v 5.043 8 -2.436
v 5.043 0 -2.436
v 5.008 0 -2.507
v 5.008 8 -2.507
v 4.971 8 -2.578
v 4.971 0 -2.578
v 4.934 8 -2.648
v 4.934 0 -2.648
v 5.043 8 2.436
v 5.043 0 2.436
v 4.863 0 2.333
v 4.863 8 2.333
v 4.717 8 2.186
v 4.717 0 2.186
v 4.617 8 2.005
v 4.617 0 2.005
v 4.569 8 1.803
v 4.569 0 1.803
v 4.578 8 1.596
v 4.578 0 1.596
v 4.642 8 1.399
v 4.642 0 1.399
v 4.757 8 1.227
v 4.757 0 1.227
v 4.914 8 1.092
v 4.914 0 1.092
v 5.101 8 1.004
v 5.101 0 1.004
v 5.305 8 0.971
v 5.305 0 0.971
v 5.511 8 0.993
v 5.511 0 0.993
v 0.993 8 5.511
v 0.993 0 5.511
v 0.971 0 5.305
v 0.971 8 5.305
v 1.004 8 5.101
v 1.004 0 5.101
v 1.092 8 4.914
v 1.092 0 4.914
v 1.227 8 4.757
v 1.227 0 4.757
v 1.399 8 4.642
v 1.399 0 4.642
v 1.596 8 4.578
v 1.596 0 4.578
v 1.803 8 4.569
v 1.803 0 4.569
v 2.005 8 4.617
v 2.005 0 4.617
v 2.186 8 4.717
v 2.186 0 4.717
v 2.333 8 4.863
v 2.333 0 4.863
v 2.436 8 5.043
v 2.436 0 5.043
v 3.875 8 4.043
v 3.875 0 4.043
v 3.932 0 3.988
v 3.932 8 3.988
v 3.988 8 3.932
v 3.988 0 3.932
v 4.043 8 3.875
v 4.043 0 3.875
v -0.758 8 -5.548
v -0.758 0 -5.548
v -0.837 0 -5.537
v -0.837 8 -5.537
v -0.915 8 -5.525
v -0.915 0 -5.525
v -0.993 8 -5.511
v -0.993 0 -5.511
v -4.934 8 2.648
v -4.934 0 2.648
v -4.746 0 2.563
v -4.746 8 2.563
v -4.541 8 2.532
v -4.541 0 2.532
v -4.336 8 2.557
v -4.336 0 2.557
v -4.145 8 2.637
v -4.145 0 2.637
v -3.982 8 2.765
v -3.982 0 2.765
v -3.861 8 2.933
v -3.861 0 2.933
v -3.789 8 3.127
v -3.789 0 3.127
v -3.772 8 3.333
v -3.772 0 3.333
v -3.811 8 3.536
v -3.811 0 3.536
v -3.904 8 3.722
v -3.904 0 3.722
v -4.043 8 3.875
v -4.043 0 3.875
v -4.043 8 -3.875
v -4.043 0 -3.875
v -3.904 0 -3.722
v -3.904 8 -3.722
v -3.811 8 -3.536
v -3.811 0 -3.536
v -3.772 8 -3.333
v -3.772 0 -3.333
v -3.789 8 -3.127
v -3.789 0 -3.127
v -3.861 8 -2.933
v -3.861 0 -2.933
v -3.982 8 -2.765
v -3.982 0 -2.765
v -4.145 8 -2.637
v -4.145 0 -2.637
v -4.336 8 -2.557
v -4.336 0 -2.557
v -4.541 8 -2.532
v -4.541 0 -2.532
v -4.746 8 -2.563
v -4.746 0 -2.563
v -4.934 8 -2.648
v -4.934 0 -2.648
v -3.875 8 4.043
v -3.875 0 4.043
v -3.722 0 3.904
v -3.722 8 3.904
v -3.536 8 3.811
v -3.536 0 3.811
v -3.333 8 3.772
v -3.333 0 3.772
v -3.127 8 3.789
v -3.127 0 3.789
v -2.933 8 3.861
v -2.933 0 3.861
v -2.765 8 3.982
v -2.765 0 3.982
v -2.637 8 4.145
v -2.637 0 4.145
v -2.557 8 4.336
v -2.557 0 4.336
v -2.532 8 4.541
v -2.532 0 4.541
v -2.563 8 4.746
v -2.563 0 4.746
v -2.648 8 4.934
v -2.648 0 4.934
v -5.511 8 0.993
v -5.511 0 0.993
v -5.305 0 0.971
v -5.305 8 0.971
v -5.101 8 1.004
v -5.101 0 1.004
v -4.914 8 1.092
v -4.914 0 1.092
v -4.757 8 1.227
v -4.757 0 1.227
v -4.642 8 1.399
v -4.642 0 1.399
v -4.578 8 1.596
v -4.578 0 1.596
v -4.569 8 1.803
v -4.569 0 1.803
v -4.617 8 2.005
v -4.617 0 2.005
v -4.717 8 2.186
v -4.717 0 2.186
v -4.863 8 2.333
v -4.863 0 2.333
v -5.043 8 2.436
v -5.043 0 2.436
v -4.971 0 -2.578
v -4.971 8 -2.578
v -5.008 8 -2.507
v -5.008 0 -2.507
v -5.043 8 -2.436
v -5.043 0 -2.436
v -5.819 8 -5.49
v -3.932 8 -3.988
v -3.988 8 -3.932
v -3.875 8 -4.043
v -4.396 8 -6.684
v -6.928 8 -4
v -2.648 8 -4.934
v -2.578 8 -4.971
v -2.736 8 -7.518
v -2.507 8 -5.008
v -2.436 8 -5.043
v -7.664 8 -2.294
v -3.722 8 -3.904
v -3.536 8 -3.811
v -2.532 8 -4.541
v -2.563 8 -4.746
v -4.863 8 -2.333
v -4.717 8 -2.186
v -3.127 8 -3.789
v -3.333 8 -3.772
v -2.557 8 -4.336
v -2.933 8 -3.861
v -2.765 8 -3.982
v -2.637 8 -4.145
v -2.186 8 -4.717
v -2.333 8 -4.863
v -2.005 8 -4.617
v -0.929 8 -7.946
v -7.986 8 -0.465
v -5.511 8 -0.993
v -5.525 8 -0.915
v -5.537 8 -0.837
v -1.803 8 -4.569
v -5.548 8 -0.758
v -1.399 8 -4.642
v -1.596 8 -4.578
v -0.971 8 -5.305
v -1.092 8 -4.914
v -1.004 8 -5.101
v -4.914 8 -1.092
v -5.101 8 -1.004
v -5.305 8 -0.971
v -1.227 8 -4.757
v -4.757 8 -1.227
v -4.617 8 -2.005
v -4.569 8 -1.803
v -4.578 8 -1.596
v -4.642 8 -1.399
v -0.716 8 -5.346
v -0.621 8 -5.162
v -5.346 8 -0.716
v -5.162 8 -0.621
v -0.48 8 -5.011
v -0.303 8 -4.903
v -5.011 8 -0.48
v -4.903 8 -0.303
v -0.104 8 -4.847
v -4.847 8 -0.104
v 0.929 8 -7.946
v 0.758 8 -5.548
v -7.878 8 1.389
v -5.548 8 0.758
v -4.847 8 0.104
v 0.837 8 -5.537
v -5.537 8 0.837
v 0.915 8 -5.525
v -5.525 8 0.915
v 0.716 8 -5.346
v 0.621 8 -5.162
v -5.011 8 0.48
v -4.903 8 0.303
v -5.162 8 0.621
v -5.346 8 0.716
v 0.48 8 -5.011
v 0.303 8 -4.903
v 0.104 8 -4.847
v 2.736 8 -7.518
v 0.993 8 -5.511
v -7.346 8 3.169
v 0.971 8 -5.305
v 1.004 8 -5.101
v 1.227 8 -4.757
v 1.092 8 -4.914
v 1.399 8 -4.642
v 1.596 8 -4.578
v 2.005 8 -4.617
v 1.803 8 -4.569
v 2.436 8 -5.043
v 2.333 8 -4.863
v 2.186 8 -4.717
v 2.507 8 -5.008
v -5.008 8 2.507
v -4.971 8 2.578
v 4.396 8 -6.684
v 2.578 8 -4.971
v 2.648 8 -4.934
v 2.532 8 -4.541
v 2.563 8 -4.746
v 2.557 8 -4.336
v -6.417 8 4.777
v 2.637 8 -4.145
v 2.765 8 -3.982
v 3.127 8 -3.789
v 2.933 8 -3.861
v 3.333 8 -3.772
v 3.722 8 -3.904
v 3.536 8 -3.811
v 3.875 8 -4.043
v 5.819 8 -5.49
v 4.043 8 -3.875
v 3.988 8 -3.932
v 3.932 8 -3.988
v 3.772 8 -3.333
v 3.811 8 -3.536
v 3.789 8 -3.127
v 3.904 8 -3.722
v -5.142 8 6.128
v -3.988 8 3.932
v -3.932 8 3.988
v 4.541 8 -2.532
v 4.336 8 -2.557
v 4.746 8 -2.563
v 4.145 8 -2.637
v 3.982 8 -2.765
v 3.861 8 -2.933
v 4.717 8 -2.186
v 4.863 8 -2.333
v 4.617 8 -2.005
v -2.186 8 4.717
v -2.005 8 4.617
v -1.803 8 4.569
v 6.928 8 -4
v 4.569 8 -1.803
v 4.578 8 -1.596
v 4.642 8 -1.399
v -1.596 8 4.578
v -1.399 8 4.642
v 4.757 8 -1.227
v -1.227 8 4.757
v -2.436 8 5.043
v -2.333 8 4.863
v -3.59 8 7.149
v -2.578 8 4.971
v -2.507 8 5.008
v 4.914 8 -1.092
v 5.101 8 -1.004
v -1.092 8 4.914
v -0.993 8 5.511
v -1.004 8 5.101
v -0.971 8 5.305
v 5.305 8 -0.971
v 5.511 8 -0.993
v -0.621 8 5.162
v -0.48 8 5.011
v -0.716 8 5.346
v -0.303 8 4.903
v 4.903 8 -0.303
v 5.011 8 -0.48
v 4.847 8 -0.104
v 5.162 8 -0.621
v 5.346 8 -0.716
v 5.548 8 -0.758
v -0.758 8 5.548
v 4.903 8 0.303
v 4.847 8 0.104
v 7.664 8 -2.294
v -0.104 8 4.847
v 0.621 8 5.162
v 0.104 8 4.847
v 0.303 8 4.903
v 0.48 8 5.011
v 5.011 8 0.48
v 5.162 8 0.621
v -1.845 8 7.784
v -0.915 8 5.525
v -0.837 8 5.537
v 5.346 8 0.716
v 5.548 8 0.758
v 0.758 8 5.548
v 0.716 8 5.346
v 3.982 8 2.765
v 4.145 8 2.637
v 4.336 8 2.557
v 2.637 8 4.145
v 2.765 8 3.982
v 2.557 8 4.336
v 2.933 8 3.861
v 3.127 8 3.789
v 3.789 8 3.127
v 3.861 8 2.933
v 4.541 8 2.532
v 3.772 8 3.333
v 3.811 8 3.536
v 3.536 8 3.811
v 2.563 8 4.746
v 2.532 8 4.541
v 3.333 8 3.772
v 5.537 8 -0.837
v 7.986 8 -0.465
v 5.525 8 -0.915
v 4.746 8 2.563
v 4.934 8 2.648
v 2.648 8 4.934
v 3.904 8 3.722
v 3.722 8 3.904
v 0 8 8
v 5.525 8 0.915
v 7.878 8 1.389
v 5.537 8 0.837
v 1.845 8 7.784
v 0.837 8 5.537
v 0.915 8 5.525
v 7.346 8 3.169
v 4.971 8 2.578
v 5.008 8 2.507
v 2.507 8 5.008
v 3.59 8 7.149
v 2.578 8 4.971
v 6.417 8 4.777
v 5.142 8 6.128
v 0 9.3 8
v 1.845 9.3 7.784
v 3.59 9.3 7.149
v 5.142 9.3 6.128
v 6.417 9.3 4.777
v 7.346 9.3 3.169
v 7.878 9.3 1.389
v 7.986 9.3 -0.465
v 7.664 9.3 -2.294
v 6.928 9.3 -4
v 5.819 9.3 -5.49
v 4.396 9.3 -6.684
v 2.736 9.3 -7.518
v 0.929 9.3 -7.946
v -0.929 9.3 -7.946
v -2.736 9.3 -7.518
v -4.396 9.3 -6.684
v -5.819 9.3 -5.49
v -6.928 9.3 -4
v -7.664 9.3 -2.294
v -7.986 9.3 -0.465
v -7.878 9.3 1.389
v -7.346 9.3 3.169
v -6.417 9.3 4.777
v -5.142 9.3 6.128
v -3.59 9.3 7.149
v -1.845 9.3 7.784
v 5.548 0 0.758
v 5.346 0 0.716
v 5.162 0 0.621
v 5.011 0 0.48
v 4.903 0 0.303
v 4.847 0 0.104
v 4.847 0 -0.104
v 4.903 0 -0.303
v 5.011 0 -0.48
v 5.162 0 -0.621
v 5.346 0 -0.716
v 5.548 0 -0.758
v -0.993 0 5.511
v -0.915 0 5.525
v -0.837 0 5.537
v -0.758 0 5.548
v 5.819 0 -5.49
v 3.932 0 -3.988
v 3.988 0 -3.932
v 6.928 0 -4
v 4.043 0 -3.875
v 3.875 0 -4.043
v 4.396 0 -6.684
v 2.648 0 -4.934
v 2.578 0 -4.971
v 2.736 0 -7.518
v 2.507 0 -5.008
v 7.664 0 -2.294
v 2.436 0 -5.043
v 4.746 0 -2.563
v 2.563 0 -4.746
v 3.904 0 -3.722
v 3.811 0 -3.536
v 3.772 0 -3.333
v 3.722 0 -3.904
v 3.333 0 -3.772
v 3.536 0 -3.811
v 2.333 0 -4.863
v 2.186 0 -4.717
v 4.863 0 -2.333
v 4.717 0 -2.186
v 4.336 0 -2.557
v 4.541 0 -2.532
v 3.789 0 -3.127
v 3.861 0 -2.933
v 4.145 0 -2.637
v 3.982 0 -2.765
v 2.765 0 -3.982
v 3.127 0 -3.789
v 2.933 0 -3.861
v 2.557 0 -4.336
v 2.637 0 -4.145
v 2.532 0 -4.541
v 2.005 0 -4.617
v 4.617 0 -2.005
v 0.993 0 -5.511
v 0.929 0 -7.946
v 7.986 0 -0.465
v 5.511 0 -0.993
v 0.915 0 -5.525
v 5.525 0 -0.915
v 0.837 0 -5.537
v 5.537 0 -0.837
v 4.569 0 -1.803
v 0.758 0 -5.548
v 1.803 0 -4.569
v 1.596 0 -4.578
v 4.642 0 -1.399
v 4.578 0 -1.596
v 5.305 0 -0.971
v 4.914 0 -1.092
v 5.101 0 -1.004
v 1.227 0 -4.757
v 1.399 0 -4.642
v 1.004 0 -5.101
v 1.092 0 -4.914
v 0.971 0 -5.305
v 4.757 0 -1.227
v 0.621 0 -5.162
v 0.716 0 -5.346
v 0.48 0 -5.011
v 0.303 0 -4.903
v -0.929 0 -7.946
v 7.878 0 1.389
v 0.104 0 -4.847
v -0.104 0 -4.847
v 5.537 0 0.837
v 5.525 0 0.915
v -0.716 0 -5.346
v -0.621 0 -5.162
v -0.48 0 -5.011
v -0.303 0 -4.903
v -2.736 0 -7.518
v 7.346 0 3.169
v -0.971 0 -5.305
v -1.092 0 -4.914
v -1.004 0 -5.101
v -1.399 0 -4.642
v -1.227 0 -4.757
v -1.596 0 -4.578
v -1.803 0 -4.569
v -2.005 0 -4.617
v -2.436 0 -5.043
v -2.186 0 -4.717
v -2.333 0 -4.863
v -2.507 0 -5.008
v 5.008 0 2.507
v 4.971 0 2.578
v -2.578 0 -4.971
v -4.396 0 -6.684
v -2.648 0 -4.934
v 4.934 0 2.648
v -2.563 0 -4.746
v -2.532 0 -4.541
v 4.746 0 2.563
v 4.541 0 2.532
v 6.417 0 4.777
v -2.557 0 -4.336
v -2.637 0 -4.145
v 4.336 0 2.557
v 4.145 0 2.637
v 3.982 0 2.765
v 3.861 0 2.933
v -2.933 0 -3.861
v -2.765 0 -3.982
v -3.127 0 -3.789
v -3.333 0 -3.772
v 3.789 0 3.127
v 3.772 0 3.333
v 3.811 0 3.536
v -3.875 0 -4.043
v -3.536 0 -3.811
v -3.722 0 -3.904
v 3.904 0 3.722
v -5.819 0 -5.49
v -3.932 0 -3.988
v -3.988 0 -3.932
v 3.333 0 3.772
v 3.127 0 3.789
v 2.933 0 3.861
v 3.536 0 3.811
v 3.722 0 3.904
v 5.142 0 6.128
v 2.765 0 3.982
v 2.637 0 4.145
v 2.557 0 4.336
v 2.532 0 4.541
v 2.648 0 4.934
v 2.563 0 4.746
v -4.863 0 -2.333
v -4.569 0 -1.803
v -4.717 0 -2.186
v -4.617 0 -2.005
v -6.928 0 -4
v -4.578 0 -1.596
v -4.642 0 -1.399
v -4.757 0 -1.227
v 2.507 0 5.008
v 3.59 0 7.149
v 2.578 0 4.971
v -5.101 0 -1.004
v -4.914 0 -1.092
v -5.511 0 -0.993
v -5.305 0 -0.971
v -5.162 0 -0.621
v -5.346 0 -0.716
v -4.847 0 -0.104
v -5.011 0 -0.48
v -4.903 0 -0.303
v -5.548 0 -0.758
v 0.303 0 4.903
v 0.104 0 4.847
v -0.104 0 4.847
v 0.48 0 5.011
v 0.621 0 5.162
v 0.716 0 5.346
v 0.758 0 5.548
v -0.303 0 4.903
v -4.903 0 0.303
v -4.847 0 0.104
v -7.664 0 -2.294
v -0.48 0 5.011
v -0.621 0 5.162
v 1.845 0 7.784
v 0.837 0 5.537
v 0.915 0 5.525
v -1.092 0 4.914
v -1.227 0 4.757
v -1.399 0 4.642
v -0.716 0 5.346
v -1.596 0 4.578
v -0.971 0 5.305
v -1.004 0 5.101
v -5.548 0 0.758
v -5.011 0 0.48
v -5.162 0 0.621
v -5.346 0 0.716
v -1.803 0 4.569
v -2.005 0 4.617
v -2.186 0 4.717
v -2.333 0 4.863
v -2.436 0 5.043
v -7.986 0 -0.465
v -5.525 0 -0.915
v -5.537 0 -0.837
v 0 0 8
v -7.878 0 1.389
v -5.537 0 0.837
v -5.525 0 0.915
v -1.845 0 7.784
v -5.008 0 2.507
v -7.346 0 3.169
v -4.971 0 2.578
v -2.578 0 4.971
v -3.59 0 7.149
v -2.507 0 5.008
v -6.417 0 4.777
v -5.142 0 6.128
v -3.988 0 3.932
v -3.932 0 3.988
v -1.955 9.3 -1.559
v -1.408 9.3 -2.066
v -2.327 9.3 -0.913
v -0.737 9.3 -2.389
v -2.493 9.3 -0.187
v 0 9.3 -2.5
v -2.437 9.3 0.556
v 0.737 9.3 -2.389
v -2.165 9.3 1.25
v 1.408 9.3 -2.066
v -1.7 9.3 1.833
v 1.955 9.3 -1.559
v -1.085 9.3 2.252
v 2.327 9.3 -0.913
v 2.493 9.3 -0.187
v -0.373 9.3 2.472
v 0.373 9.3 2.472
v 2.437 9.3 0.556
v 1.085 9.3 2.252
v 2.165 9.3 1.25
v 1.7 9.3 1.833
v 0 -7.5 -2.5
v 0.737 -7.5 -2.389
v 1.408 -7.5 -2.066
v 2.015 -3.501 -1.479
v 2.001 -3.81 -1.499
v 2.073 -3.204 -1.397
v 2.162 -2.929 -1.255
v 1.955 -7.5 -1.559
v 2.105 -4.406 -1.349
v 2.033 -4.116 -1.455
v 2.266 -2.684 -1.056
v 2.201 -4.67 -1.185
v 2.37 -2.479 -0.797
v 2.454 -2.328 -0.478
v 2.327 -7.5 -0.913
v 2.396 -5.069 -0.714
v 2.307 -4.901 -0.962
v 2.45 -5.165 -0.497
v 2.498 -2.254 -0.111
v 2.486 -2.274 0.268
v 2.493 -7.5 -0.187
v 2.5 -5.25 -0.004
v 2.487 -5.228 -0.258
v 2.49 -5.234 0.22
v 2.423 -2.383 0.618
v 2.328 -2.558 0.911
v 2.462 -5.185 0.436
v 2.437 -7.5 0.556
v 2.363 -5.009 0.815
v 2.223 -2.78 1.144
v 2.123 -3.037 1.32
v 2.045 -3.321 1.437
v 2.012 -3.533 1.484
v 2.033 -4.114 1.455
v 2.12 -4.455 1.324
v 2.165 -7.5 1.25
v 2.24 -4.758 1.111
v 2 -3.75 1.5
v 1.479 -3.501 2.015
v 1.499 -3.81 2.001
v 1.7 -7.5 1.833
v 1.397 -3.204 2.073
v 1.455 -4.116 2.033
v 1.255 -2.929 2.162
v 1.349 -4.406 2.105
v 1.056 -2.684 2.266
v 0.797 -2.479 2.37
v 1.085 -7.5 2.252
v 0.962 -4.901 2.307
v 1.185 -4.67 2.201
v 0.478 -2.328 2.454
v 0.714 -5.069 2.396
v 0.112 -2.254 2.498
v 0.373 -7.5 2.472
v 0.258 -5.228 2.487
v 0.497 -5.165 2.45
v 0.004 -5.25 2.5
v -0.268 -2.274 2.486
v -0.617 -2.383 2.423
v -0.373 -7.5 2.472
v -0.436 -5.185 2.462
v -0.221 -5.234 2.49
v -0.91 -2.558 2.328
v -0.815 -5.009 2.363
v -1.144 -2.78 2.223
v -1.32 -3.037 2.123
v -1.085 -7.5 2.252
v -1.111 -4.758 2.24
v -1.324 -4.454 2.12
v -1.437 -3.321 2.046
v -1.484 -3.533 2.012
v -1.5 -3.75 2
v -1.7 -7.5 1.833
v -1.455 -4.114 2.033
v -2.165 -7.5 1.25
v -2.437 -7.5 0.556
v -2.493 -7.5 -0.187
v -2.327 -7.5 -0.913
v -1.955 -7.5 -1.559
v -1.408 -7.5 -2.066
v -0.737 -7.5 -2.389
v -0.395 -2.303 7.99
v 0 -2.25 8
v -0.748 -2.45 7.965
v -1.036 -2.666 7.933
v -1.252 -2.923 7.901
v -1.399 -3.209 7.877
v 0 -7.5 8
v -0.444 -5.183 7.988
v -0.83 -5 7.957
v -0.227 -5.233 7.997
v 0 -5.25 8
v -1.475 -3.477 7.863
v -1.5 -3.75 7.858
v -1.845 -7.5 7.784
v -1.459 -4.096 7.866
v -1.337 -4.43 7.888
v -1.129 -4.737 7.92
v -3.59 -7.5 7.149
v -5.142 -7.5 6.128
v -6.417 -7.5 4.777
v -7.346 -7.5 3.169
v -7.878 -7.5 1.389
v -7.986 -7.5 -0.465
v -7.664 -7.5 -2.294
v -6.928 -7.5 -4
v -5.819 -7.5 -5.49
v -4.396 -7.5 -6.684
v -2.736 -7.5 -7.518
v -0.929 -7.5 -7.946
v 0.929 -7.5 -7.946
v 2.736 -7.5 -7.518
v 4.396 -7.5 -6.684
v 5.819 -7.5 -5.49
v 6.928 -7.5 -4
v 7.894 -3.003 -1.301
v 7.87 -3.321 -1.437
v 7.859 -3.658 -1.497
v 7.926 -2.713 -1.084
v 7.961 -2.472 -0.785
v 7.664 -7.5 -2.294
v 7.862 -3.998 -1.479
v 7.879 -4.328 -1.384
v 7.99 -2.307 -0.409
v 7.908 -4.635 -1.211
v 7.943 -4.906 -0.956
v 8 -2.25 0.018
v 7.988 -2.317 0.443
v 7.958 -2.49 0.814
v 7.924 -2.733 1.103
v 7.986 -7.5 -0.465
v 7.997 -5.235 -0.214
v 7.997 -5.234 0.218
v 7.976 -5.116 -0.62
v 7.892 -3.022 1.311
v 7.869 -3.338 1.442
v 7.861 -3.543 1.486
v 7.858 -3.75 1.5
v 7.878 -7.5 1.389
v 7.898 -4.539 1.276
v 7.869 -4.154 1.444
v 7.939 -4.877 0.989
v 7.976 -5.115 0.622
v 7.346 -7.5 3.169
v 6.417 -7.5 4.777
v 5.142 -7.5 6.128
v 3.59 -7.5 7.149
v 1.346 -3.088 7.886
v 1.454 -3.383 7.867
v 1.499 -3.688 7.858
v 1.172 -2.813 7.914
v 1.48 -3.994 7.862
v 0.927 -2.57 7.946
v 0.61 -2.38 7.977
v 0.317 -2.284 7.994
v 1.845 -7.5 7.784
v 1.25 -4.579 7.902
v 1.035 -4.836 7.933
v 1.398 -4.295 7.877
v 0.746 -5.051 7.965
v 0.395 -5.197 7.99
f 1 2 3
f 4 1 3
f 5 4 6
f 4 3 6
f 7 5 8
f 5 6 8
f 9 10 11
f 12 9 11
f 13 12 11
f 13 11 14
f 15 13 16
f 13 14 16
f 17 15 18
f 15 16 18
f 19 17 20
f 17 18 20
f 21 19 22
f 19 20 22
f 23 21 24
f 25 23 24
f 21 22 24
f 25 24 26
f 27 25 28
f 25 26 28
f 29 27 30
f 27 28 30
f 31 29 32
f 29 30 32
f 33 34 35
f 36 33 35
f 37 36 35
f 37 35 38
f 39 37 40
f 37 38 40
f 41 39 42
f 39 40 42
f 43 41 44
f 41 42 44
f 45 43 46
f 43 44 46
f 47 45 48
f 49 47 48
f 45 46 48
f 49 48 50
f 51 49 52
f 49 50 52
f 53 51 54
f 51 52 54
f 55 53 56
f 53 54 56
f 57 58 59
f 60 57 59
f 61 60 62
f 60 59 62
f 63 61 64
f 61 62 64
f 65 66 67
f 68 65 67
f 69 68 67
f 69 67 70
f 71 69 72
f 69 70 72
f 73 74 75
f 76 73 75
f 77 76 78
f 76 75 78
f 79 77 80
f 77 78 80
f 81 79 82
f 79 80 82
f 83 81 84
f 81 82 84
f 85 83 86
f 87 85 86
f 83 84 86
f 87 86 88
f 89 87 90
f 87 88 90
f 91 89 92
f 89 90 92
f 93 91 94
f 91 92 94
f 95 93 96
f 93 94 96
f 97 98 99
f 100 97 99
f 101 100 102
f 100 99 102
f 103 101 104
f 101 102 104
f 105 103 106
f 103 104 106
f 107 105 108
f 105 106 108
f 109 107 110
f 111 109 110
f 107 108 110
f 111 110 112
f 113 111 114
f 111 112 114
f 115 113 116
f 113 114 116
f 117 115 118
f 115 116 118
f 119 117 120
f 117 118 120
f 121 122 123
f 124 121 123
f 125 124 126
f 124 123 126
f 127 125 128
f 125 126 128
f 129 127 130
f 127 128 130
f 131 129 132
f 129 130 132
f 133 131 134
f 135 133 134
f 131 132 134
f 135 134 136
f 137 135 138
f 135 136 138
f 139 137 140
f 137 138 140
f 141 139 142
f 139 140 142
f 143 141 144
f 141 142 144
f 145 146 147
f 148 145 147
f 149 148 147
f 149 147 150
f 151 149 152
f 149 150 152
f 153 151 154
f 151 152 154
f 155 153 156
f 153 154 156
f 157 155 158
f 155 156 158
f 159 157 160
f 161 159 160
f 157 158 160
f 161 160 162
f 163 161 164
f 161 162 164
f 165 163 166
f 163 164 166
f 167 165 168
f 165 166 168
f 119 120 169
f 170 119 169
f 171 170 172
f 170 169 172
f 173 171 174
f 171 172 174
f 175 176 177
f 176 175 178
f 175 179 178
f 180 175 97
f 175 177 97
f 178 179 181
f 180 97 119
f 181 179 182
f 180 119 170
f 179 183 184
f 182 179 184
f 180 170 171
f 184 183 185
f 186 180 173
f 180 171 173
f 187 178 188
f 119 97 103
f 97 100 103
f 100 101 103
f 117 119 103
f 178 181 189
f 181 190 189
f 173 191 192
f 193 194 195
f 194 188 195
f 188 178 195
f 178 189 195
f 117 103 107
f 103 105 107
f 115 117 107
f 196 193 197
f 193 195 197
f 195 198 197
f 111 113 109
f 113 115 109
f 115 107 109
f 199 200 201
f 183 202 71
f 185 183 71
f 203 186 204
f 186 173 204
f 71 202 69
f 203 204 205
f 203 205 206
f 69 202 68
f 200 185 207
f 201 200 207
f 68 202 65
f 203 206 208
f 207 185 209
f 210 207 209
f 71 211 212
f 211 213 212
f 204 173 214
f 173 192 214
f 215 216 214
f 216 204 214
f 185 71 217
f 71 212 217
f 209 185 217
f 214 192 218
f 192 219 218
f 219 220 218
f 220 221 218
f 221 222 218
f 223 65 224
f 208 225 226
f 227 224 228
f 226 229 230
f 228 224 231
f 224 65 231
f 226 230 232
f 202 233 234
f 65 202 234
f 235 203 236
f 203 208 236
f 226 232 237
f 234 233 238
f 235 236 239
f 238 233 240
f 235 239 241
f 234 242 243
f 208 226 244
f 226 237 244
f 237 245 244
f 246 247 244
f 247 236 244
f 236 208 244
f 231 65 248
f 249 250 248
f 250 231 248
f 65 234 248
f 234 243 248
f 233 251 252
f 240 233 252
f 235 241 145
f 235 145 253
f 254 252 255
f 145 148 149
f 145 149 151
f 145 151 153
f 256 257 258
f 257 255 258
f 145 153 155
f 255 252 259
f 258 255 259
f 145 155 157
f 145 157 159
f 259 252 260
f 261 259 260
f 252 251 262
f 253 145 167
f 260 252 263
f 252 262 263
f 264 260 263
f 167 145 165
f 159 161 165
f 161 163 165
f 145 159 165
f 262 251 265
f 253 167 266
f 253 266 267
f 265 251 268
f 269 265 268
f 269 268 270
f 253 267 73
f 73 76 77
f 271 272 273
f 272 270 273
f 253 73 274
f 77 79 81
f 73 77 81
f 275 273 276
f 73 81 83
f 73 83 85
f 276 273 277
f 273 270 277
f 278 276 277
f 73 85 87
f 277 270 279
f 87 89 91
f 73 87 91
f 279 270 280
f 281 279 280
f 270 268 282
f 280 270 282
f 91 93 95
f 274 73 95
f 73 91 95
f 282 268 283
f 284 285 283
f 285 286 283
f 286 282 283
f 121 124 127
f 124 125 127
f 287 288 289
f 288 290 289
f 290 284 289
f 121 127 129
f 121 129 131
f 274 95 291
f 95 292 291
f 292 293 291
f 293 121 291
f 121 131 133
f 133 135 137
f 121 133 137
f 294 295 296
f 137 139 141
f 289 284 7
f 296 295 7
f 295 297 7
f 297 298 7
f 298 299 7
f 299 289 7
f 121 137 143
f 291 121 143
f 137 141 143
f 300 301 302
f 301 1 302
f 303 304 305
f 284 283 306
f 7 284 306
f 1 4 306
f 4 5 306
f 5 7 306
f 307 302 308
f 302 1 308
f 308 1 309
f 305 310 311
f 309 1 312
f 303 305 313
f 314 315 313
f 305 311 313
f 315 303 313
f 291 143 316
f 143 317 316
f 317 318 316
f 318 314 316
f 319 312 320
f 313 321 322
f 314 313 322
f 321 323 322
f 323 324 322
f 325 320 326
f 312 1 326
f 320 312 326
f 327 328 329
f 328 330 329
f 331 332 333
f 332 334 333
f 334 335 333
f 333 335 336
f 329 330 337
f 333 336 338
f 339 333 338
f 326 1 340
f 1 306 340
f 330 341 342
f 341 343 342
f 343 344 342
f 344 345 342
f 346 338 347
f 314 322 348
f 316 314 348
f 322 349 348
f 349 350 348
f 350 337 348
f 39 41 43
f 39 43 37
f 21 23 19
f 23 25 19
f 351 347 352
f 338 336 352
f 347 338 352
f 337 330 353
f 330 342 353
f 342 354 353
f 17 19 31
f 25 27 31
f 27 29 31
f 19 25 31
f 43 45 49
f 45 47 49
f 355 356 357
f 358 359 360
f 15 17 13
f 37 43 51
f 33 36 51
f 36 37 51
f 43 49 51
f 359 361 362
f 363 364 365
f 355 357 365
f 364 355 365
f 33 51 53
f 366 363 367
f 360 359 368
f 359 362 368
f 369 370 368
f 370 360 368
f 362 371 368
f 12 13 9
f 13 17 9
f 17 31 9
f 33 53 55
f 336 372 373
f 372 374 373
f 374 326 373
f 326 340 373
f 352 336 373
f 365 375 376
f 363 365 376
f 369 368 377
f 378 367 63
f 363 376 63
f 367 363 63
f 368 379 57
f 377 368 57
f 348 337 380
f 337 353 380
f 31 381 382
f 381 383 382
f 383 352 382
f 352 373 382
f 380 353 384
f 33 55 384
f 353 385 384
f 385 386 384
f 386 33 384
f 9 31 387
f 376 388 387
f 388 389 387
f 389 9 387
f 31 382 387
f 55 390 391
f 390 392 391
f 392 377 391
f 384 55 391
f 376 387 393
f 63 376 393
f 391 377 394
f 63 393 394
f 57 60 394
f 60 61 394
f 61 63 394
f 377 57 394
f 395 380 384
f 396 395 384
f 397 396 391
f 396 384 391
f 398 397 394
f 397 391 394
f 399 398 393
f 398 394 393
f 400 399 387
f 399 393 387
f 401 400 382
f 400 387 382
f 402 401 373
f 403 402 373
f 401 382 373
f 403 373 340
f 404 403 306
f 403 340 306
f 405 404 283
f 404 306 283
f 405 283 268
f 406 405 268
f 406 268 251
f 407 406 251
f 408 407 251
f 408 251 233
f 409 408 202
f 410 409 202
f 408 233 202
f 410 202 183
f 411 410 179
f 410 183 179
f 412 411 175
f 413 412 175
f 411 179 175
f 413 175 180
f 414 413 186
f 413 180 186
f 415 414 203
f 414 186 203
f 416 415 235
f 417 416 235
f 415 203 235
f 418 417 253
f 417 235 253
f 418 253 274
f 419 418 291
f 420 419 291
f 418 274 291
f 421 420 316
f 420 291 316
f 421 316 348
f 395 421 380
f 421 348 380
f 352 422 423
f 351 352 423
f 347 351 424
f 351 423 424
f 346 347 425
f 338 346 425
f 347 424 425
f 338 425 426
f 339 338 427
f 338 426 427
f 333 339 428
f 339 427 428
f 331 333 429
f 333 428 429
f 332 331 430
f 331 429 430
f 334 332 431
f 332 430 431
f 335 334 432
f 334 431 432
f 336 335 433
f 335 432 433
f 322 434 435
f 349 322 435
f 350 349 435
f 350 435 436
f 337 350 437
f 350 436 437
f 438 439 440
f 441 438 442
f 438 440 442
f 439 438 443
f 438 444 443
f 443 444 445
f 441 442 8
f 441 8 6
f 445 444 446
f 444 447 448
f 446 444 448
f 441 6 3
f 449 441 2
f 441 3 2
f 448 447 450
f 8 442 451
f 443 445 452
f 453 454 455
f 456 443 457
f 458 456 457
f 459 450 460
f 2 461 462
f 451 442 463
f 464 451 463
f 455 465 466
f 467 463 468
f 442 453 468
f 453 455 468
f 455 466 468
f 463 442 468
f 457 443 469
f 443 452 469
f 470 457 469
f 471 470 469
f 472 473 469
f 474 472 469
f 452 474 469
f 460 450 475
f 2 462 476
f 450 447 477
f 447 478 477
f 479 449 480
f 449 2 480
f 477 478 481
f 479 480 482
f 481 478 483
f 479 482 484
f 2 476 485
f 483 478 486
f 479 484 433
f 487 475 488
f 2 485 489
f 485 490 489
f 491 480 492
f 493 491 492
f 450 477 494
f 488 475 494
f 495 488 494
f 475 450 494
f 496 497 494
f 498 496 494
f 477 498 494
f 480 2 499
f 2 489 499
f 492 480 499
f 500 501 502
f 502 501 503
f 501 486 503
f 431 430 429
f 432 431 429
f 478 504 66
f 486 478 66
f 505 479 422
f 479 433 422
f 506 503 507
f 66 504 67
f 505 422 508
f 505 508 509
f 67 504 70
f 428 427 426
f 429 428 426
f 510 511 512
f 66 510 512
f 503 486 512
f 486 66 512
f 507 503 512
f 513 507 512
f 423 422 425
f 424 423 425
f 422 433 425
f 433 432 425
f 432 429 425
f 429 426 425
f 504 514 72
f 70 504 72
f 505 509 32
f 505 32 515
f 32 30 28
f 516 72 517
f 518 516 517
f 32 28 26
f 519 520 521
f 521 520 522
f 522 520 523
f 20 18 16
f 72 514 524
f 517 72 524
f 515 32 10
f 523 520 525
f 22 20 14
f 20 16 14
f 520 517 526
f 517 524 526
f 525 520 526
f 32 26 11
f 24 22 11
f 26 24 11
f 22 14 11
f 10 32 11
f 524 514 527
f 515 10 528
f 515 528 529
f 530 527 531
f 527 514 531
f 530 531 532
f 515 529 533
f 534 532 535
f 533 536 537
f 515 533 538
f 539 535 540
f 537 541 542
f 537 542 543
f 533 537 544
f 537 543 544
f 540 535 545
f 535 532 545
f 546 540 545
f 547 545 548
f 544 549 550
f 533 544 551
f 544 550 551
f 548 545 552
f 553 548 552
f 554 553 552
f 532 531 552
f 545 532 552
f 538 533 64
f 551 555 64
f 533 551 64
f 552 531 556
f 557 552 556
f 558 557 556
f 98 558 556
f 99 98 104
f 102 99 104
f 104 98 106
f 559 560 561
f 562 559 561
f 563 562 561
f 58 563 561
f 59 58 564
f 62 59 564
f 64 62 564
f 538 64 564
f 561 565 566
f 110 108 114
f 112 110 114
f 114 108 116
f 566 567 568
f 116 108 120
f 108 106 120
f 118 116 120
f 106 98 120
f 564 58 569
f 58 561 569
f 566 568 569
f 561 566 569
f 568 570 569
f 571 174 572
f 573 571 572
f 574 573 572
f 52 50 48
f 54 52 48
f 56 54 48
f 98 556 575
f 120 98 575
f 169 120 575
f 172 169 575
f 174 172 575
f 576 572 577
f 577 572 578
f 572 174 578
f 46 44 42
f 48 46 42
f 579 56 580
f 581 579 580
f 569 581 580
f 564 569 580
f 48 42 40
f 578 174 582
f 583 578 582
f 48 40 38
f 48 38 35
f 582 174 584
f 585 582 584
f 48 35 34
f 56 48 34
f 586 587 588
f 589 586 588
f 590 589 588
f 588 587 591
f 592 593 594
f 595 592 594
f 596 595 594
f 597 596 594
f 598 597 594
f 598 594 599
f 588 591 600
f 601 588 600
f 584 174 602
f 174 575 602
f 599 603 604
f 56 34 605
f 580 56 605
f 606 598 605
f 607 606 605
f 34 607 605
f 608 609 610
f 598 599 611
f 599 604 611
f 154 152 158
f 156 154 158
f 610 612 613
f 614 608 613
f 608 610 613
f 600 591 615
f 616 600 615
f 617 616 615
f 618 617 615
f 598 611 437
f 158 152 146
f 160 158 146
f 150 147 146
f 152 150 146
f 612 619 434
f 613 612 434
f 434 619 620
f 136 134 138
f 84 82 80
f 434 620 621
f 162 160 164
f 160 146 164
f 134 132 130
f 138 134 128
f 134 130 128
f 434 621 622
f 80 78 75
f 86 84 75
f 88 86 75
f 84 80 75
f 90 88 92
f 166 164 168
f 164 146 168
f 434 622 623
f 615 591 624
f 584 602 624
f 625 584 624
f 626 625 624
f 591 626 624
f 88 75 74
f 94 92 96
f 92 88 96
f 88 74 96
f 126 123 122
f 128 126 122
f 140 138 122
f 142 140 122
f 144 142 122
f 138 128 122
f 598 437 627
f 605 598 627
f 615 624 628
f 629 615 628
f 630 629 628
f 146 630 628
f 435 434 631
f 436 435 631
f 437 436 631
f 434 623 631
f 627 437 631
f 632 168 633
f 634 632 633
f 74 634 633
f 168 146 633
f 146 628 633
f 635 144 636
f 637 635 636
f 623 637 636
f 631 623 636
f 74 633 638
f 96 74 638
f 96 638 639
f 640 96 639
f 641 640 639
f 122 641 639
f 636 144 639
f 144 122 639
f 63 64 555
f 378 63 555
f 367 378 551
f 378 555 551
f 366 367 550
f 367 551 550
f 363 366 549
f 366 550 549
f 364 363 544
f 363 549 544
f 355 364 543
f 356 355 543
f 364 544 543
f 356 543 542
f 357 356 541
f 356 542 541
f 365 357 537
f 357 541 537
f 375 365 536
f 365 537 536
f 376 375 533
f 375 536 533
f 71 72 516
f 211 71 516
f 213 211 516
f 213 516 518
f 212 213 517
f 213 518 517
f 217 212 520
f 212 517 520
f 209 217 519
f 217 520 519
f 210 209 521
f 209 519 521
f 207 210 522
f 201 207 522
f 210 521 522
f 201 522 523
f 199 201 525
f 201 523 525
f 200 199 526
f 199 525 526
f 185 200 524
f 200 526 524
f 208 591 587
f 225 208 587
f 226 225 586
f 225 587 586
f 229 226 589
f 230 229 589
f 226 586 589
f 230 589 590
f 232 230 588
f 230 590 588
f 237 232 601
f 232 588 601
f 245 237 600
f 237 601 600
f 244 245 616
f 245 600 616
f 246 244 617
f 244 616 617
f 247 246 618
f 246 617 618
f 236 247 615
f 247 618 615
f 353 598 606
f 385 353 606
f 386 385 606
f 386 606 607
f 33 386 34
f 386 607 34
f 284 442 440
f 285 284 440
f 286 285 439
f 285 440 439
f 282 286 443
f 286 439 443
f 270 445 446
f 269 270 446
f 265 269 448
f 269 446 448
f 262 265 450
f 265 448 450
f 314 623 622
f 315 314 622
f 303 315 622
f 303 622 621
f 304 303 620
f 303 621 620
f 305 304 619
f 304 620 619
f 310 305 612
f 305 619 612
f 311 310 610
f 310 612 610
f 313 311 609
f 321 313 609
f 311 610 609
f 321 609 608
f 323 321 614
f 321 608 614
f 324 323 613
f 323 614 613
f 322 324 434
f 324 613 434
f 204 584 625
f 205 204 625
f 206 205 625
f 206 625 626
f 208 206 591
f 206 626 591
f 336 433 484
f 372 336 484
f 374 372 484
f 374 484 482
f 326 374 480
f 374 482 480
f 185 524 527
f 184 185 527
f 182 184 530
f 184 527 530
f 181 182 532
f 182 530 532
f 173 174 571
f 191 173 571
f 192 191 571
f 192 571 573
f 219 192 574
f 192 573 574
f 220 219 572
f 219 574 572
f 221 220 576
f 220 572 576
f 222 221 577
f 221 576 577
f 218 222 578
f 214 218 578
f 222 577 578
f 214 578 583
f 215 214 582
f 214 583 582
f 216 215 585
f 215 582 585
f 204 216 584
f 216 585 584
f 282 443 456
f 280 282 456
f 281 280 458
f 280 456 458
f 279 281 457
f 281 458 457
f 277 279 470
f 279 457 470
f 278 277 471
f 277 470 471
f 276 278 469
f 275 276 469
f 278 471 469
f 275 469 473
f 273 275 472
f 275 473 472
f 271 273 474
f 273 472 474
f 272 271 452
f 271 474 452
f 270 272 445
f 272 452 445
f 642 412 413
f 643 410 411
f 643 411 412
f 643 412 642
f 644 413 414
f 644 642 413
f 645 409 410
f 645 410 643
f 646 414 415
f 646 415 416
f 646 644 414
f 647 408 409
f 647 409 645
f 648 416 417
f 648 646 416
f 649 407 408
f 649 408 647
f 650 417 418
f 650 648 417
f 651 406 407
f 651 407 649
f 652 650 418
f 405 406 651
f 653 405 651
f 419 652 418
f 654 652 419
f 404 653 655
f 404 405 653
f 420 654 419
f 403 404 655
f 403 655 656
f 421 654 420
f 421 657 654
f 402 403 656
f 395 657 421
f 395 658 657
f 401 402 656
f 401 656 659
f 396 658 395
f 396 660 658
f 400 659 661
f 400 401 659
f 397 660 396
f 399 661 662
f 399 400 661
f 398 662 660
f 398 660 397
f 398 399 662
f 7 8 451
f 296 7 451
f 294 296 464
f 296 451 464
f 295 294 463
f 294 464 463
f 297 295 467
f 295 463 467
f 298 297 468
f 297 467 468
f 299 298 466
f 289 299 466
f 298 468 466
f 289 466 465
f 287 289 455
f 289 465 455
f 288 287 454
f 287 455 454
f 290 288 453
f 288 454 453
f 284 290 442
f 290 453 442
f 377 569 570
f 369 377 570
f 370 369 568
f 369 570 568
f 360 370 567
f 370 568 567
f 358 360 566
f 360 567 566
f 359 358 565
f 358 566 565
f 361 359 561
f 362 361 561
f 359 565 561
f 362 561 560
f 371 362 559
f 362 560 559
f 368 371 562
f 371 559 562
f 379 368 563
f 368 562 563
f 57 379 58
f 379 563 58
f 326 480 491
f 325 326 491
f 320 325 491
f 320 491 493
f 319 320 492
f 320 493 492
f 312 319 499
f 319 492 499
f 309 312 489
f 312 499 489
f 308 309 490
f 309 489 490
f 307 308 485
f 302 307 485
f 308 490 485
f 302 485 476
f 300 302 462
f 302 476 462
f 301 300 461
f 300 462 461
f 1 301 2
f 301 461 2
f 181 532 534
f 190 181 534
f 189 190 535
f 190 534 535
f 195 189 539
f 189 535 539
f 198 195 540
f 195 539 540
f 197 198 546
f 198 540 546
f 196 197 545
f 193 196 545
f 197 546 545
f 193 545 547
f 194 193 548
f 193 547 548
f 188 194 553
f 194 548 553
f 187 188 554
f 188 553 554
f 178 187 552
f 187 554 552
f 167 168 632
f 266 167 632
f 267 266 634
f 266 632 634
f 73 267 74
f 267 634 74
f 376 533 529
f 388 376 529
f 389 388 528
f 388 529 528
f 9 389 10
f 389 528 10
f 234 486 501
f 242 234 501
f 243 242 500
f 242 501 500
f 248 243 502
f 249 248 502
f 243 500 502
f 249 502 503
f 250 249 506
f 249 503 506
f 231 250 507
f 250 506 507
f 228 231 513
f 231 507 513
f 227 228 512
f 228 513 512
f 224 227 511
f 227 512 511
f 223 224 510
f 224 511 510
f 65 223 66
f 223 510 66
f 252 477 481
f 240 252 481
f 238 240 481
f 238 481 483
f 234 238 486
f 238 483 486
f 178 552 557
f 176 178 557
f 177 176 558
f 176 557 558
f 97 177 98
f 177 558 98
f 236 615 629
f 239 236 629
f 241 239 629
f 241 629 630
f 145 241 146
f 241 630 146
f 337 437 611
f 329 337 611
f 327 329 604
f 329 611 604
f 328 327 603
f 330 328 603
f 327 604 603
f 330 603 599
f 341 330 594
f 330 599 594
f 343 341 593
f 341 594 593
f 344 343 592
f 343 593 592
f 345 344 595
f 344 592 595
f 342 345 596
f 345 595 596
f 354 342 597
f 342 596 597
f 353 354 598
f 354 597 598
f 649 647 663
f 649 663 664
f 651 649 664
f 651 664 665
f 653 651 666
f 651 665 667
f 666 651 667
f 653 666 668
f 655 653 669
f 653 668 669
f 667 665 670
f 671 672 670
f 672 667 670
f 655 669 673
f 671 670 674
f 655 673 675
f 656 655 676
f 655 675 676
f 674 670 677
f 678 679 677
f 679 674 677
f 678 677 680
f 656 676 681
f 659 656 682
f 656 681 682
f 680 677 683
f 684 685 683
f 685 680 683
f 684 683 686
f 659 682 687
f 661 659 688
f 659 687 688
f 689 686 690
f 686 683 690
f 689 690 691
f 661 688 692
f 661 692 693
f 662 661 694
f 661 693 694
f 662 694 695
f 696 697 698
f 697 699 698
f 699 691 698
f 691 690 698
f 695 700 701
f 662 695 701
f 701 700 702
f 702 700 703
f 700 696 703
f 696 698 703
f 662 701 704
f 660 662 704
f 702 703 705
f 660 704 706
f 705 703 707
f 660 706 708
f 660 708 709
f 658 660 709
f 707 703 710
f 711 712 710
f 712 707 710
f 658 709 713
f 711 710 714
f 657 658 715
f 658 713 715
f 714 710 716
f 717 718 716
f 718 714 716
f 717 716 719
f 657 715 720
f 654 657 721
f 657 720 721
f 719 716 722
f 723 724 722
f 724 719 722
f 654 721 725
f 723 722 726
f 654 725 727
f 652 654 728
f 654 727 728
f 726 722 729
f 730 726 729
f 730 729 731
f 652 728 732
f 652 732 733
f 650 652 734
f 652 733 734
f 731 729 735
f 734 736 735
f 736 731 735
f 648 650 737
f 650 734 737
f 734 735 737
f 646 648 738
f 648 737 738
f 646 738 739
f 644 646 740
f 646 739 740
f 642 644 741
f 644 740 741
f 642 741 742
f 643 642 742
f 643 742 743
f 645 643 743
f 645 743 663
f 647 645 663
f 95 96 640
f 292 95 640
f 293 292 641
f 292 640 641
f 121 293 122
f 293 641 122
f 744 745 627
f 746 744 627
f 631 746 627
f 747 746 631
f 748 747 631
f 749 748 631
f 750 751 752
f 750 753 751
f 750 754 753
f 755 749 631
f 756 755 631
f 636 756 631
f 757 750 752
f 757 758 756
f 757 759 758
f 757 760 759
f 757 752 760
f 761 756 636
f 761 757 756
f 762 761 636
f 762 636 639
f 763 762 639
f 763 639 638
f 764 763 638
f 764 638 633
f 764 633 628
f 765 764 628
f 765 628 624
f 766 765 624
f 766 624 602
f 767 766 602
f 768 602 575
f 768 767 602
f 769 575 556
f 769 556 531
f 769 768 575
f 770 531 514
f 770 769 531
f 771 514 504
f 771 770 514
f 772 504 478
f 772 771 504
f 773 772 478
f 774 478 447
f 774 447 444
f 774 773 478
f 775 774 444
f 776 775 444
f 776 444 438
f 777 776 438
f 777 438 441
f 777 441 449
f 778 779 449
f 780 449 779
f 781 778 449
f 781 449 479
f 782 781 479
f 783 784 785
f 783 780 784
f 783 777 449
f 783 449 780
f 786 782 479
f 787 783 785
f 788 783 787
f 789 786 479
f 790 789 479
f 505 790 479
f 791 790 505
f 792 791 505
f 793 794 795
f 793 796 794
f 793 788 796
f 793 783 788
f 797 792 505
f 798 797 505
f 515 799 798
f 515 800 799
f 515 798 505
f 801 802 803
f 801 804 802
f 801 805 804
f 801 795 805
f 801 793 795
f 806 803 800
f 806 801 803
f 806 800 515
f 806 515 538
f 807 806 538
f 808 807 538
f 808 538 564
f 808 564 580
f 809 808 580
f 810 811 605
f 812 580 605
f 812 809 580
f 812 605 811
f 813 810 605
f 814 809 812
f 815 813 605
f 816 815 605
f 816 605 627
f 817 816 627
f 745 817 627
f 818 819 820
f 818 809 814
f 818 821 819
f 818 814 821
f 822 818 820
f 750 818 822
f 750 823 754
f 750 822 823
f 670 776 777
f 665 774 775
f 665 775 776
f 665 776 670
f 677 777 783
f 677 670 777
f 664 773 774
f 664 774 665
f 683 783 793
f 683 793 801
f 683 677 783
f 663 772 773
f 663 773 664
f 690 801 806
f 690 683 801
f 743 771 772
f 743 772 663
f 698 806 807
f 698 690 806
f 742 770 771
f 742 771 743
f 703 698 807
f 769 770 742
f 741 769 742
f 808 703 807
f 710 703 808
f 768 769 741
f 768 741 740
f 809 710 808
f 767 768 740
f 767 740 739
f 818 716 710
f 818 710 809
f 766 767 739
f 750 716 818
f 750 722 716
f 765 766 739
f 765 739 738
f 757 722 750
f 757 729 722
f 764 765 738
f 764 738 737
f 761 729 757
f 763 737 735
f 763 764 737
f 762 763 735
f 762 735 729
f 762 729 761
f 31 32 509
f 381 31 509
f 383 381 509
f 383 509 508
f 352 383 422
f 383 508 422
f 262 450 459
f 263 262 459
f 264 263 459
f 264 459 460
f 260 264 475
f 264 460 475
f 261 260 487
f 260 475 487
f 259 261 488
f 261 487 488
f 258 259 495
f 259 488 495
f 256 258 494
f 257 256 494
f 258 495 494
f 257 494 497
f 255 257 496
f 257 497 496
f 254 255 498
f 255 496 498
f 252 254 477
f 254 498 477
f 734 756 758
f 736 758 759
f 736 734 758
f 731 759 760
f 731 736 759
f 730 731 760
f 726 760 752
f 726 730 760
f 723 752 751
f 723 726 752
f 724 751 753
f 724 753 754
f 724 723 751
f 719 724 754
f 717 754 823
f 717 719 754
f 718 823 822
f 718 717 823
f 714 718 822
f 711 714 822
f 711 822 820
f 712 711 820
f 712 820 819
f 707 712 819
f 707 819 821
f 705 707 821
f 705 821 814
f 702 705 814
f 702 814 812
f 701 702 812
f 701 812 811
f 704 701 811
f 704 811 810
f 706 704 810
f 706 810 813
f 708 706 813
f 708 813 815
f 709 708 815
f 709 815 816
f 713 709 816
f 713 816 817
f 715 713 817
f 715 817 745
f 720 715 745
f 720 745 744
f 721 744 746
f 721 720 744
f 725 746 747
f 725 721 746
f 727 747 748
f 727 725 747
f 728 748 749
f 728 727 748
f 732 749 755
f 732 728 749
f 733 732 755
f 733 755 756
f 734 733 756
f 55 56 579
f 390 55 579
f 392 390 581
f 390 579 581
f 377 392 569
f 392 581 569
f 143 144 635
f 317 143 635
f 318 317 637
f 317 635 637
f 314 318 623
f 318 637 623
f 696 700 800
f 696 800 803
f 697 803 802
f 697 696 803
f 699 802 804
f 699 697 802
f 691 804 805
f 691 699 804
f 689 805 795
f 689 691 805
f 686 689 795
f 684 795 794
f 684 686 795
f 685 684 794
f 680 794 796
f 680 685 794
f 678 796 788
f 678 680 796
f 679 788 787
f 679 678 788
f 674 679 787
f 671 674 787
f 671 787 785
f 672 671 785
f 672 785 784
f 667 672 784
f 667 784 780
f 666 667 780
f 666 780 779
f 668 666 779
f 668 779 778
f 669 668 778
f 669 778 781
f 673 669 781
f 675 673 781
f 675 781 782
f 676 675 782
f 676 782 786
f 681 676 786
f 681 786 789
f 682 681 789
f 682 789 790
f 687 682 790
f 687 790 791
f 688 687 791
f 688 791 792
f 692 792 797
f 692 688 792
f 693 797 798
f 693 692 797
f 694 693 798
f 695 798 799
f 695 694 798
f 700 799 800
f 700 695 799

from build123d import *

# Parameters (mm, degrees)
BOSS_EXTRUDE1_DEPTH = 8
SKETCH2_R           = 8
BOSS_EXTRUDE2_DEPTH = 1.3
BOSS_EXTRUDE3_START = 7.5
SKETCH3_R           = 8
BOSS_EXTRUDE3_DEPTH = 7.5
SKETCH4_R           = 2.5
CUT_EXTRUDE1_DEPTH  = 18.5
SKETCH5_R           = 1.5
CUT_EXTRUDE2_DEPTH  = 10.5
SKETCH6_R           = 1.5
CUT_EXTRUDE3_DEPTH  = 16.5


with BuildPart() as part:
    # Sketch1 → Boss-Extrude1 (new body)
    with BuildSketch(Plane(origin=(0, 0, 0), x_dir=(1, 0, 0), z_dir=(0, 1, 0))):
        with BuildLine():
            ThreePointArc((-2.435695647, 5.042557557), (-2.542346799, 4.989636535), (-2.647848779, 4.934460137))
            ThreePointArc((-2.647848779, 4.934460137), (-2.844880621, 3.915642253), (-3.874720197, 4.043085876))
            ThreePointArc((-3.874720197, 4.043085876), (-3.959797975, 3.959797975), (-4.043085876, 3.874720197))
            ThreePointArc((-4.043085876, 3.874720197), (-3.915642253, 2.844880621), (-4.934460137, 2.647848779))
            ThreePointArc((-4.934460137, 2.647848779), (-4.989636535, 2.542346799), (-5.042557557, 2.435695647))
            ThreePointArc((-5.042557557, 2.435695647), (-4.603113539, 1.495642253), (-5.511180739, 0.993421795))
            ThreePointArc((-5.511180739, 0.993421795), (-5.531054707, 0.876033004), (-5.548428571, 0.758248236))
            ThreePointArc((-5.548428571, 0.758248236), (-4.84, 0), (-5.548428571, -0.758248236))
            ThreePointArc((-5.548428571, -0.758248236), (-5.531054707, -0.876033004), (-5.511180739, -0.993421795))
            ThreePointArc((-5.511180739, -0.993421795), (-4.603113539, -1.495642253), (-5.042557557, -2.435695647))
            ThreePointArc((-5.042557557, -2.435695647), (-4.989636535, -2.542346799), (-4.934460137, -2.647848779))
            ThreePointArc((-4.934460137, -2.647848779), (-3.915642253, -2.844880621), (-4.043085876, -3.874720197))
            ThreePointArc((-4.043085876, -3.874720197), (-3.959797975, -3.959797975), (-3.874720197, -4.043085876))
            ThreePointArc((-3.874720197, -4.043085876), (-2.844880621, -3.915642253), (-2.647848779, -4.934460137))
            ThreePointArc((-2.647848779, -4.934460137), (-2.542346799, -4.989636535), (-2.435695647, -5.042557557))
            ThreePointArc((-2.435695647, -5.042557557), (-1.495642253, -4.603113539), (-0.993421795, -5.511180739))
            ThreePointArc((-0.993421795, -5.511180739), (-0.876033004, -5.531054707), (-0.758248236, -5.548428571))
            ThreePointArc((-0.758248236, -5.548428571), (0, -4.84), (0.758248236, -5.548428571))
            ThreePointArc((0.758248236, -5.548428571), (0.876033004, -5.531054707), (0.993421795, -5.511180739))
            ThreePointArc((0.993421795, -5.511180739), (1.495642253, -4.603113539), (2.435695647, -5.042557557))
            ThreePointArc((2.435695647, -5.042557557), (2.542346799, -4.989636535), (2.647848779, -4.934460137))
            ThreePointArc((2.647848779, -4.934460137), (2.844880621, -3.915642253), (3.874720197, -4.043085876))
            ThreePointArc((3.874720197, -4.043085876), (3.959797975, -3.959797975), (4.043085876, -3.874720197))
            ThreePointArc((4.043085876, -3.874720197), (3.915642253, -2.844880621), (4.934460137, -2.647848779))
            ThreePointArc((4.934460137, -2.647848779), (4.989636535, -2.542346799), (5.042557557, -2.435695647))
            ThreePointArc((5.042557557, -2.435695647), (4.603113539, -1.495642253), (5.511180739, -0.993421795))
            ThreePointArc((5.511180739, -0.993421795), (5.531054707, -0.876033004), (5.548428571, -0.758248236))
            ThreePointArc((5.548428571, -0.758248236), (4.84, 0), (5.548428571, 0.758248236))
            ThreePointArc((5.548428571, 0.758248236), (5.531054707, 0.876033004), (5.511180739, 0.993421795))
            ThreePointArc((5.511180739, 0.993421795), (4.603113539, 1.495642253), (5.042557557, 2.435695647))
            ThreePointArc((5.042557557, 2.435695647), (4.989636535, 2.542346799), (4.934460137, 2.647848779))
            ThreePointArc((4.934460137, 2.647848779), (3.915642253, 2.844880621), (4.043085876, 3.874720197))
            ThreePointArc((4.043085876, 3.874720197), (3.959797975, 3.959797975), (3.874720197, 4.043085876))
            ThreePointArc((3.874720197, 4.043085876), (2.844880621, 3.915642253), (2.647848779, 4.934460137))
            ThreePointArc((2.647848779, 4.934460137), (2.542346799, 4.989636535), (2.435695647, 5.042557557))
            ThreePointArc((2.435695647, 5.042557557), (1.495642253, 4.603113539), (0.993421795, 5.511180739))
            ThreePointArc((0.993421795, 5.511180739), (0.876033004, 5.531054707), (0.758248236, 5.548428571))
            ThreePointArc((0.758248236, 5.548428571), (0, 4.84), (-0.758248236, 5.548428571))
            ThreePointArc((-0.758248236, 5.548428571), (-0.876033004, 5.531054707), (-0.993421795, 5.511180739))
            ThreePointArc((-0.993421795, 5.511180739), (-1.495642253, 4.603113539), (-2.435695647, 5.042557557))
        make_face()
    extrude(amount=BOSS_EXTRUDE1_DEPTH)

    # Sketch2 → Boss-Extrude2 (add)
    with BuildSketch(Plane(origin=(0, 8, 0), x_dir=(1, 0, 0), z_dir=(0, 1, 0))):
        with Locations(Location((0, 0, 0), (0, 0, 270))):
            Circle(SKETCH2_R)
    extrude(amount=BOSS_EXTRUDE2_DEPTH)

    # Sketch3 → Boss-Extrude3 (add)
    with BuildSketch(Plane.XZ.offset(BOSS_EXTRUDE3_START)):
        with Locations(Location((0, 0, 0), (0, 0, 90))):
            Circle(SKETCH3_R)
    extrude(amount=-BOSS_EXTRUDE3_DEPTH)

    # Sketch4 → Cut-Extrude1 (cut)
    with BuildSketch(Plane.XZ.offset(7.5)):
        with Locations(Location((0, 0, 0), (0, 0, 270))):
            Circle(SKETCH4_R)
    extrude(amount=-CUT_EXTRUDE1_DEPTH, mode=Mode.SUBTRACT)

    # Sketch5 → Cut-Extrude2 (cut)
    with BuildSketch(Plane(origin=(0, 0, 0), x_dir=(0, 0, -1), z_dir=(1, 0, 0))):
        with Locations(Location((0, -3.75, 0), (0, 0, 180))):
            Circle(SKETCH5_R)
    extrude(amount=CUT_EXTRUDE2_DEPTH, mode=Mode.SUBTRACT)

    # Sketch6 → Cut-Extrude3 (cut)
    with BuildSketch(Plane.XY):
        with Locations(Location((0, -3.75, 0), (0, 0, 180))):
            Circle(SKETCH6_R)
    extrude(amount=CUT_EXTRUDE3_DEPTH, mode=Mode.SUBTRACT)


solid = part.part
